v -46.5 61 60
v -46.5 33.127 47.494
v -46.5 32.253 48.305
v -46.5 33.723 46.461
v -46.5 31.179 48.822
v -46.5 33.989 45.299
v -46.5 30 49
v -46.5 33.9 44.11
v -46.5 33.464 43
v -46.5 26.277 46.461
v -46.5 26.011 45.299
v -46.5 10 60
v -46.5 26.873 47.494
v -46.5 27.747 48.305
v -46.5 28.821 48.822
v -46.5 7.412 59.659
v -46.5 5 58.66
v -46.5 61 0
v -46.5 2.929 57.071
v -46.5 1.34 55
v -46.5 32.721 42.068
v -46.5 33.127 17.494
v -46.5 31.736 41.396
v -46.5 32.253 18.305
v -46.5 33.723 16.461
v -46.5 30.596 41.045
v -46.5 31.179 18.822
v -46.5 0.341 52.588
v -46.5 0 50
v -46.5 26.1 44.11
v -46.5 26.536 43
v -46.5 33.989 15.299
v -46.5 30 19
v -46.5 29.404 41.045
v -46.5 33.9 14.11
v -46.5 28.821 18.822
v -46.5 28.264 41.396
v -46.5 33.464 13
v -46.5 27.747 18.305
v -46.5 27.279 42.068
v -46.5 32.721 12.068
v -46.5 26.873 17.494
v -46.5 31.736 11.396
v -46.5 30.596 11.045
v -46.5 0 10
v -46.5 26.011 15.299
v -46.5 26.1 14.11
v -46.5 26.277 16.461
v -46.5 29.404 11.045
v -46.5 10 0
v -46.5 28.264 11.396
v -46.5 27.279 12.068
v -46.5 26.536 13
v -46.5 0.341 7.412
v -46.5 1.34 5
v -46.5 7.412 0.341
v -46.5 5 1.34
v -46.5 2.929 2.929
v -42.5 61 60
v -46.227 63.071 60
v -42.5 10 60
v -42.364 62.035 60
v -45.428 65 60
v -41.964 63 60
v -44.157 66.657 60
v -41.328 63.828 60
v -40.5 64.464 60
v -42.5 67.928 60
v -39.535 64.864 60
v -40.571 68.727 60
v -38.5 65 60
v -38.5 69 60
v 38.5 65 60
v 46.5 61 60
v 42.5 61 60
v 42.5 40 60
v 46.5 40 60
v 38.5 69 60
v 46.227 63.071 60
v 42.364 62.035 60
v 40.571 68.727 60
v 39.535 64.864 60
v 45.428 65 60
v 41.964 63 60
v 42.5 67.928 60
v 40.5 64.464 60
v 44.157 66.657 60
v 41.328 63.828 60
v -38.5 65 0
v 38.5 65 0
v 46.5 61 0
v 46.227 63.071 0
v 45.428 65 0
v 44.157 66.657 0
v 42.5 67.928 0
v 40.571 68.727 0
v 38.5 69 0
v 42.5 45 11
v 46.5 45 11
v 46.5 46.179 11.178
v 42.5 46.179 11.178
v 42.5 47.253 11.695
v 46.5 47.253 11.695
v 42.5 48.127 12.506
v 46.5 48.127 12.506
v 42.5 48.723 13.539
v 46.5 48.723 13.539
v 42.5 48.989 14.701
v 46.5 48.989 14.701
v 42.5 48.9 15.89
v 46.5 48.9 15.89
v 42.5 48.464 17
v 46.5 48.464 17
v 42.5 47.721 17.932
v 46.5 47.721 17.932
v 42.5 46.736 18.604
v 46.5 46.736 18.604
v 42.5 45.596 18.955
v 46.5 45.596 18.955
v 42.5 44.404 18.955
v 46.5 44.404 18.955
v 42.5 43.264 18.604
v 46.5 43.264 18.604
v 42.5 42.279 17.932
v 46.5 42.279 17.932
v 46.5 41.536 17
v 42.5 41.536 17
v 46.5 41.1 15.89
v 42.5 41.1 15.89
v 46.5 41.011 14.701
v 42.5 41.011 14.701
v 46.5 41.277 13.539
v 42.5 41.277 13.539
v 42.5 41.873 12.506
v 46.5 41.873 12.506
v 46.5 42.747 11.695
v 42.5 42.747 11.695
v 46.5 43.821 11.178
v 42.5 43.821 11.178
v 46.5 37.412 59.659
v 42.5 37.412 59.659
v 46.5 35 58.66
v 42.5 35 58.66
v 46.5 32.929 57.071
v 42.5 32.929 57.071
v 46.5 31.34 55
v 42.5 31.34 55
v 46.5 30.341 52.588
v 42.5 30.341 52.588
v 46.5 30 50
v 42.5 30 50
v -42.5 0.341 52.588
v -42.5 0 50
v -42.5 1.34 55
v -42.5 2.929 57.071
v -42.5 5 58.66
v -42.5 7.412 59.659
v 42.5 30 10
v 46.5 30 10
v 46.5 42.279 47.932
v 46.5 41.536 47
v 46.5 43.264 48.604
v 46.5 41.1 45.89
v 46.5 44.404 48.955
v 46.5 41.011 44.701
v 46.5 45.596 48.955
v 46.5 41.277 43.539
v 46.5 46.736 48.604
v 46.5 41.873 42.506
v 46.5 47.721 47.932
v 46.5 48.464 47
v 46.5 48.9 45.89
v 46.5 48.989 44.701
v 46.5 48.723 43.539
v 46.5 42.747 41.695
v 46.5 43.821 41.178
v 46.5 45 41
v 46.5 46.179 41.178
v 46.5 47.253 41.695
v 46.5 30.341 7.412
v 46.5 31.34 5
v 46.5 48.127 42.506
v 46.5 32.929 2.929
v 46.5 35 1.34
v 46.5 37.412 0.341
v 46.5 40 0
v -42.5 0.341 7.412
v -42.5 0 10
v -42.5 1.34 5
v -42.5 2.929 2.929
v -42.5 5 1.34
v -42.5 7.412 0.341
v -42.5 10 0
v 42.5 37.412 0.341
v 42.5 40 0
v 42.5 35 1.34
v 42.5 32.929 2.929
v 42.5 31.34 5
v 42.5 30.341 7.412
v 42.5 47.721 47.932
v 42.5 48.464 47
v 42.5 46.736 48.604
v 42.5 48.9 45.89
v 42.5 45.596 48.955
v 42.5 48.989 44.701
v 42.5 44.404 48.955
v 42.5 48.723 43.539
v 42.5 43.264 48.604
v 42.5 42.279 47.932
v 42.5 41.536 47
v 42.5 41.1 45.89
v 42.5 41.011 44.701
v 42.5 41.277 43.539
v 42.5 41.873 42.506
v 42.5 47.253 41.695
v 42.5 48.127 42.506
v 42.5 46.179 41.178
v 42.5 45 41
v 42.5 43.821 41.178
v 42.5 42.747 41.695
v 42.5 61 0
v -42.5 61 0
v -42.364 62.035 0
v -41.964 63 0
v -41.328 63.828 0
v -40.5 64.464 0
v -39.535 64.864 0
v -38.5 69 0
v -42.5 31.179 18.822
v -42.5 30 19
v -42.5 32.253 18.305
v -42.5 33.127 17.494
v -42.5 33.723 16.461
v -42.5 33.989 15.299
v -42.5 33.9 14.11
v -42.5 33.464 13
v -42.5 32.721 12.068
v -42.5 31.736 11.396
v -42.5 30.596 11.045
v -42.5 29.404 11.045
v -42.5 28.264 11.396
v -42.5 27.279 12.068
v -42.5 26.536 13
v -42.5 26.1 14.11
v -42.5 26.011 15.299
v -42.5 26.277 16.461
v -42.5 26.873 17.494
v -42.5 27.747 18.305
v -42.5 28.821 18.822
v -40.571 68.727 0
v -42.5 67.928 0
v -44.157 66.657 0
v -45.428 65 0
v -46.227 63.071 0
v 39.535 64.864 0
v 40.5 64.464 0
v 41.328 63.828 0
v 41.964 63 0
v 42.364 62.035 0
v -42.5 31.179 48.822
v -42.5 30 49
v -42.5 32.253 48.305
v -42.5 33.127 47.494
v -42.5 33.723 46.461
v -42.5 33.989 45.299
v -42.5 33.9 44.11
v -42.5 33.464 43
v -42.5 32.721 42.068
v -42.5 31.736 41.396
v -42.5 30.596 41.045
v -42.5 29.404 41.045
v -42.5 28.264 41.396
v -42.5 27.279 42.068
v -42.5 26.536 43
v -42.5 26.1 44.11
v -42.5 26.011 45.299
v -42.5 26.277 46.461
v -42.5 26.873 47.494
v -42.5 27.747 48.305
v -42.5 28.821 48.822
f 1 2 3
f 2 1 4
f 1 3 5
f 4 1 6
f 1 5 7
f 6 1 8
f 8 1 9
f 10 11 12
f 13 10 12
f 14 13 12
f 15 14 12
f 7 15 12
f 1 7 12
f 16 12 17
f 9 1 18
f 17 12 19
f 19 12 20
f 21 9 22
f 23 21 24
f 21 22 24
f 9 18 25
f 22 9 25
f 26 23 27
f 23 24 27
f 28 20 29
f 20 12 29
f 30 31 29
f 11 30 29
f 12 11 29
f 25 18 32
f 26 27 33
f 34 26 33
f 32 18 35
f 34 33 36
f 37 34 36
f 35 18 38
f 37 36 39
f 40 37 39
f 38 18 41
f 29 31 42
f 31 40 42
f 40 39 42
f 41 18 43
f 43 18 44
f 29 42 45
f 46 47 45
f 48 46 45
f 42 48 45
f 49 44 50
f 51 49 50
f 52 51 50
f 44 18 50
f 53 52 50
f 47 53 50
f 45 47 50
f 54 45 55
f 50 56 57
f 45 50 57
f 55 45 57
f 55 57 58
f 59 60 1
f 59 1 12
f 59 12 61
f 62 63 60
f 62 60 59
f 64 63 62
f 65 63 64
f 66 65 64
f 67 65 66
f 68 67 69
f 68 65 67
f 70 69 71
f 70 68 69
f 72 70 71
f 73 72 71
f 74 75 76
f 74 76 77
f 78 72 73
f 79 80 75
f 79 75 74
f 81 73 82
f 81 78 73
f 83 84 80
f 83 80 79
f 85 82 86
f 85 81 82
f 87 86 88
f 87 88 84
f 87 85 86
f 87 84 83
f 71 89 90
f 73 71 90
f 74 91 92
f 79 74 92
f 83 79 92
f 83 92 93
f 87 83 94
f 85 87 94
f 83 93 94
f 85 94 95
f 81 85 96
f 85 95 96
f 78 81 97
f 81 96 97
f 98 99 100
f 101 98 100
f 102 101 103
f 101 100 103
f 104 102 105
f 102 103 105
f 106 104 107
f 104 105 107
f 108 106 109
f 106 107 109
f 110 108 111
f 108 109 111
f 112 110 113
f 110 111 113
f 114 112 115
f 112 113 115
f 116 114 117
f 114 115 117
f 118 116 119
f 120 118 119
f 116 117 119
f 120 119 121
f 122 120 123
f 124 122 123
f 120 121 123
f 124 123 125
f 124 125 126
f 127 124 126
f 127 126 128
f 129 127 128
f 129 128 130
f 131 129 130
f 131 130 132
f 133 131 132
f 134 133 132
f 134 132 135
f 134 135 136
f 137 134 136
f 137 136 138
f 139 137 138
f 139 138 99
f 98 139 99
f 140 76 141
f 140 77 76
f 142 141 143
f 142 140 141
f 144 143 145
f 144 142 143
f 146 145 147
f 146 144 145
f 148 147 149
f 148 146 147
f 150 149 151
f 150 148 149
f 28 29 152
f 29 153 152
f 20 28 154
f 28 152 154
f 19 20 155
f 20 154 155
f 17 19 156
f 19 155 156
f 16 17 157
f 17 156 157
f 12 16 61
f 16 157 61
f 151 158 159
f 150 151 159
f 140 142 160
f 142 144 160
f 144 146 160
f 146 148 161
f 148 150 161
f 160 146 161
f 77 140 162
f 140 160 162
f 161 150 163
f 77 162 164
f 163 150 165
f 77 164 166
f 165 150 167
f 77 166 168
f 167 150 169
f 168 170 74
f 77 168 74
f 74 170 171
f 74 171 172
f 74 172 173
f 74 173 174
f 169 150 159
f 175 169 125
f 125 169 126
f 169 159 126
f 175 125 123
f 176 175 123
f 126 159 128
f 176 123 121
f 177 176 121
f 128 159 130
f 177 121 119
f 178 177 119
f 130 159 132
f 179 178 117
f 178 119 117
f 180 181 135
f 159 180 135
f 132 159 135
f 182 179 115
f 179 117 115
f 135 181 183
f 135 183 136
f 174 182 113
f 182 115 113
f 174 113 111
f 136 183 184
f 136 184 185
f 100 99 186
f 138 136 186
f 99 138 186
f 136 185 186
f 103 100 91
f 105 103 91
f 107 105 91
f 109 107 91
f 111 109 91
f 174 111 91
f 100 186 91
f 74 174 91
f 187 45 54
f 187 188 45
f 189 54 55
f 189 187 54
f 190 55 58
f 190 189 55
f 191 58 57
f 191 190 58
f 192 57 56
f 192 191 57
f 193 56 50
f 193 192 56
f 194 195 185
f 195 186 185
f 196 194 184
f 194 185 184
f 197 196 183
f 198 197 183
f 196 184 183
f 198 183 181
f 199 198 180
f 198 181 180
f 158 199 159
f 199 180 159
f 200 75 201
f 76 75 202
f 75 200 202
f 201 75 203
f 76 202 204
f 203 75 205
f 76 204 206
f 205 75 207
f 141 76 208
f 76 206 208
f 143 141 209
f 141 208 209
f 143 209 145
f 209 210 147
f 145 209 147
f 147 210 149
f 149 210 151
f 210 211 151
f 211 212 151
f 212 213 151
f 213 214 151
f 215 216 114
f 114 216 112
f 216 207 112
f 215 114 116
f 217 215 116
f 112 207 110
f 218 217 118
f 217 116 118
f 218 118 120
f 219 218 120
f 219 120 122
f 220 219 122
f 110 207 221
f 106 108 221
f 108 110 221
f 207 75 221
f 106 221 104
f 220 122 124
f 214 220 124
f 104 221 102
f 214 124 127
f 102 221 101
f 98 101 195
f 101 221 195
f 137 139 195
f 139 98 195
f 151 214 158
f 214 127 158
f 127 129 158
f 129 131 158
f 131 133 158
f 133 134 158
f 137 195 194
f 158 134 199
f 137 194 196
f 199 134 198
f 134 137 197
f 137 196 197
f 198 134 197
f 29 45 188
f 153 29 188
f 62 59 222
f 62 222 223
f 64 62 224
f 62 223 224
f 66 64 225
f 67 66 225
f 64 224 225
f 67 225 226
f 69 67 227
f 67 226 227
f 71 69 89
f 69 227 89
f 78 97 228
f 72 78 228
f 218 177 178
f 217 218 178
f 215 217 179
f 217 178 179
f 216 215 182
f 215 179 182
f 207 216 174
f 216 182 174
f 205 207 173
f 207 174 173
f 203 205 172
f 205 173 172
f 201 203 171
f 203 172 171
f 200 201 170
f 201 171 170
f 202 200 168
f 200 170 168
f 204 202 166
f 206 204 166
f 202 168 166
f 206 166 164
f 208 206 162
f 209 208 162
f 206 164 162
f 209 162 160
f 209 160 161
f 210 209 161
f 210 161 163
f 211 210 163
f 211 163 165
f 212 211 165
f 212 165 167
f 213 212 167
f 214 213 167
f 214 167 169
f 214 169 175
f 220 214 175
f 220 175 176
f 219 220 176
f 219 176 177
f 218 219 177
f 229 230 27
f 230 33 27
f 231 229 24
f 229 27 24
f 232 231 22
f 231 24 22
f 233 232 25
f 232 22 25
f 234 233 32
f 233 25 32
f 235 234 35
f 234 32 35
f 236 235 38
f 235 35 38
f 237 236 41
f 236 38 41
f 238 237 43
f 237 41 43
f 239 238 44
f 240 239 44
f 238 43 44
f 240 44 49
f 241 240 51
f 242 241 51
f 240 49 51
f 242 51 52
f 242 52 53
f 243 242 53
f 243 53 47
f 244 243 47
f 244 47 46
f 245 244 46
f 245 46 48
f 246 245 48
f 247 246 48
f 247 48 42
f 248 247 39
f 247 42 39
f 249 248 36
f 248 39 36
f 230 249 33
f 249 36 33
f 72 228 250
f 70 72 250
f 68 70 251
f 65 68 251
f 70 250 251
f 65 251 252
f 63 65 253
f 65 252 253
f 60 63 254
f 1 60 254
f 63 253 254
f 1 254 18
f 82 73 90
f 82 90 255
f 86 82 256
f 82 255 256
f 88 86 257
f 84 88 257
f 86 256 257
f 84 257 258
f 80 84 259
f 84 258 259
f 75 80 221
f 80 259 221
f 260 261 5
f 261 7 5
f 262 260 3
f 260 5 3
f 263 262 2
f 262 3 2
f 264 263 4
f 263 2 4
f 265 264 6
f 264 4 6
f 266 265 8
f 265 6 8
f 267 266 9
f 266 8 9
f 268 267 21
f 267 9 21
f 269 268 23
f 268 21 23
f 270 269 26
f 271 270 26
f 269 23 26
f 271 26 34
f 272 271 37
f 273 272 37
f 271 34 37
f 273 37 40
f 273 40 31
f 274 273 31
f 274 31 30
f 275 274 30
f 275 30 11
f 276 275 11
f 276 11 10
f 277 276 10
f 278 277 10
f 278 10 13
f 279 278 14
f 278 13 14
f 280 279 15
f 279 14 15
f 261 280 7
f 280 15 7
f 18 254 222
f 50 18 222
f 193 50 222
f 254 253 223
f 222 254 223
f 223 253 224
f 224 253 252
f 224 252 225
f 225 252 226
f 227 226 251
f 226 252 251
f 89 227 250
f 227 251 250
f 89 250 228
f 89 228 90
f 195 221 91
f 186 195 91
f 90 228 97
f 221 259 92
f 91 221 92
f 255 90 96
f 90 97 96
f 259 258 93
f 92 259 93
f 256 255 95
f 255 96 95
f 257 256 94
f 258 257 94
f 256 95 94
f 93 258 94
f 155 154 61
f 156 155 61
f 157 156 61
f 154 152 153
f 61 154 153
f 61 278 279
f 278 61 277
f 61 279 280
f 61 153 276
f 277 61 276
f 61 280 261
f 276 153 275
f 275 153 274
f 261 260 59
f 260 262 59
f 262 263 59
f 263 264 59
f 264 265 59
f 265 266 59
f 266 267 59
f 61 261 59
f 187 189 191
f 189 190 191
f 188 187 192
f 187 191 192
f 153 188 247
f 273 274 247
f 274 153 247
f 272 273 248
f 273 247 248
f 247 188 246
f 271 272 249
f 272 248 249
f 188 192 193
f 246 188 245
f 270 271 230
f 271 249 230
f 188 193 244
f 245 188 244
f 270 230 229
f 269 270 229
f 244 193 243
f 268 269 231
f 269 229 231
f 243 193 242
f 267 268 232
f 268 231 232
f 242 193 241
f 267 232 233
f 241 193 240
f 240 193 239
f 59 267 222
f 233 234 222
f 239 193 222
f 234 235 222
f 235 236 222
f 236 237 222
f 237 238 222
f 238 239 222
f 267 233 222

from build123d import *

# Parameters (mm, degrees)
EXTRUDE_1_DEPTH     = 60
CUT_EXTRUDE_1_REACH = 95
SKETCH_2_R          = 4
FILLET_1_R          = 10
CUT_EXTRUDE_2_REACH = 95
SKETCH_3_R          = 4


with BuildPart() as part:
    # 草图1 → 凸台-拉伸1 (new body)
    with BuildSketch(Plane.XY):
        with BuildLine():
            Line((-42.5, 0), (-42.5, 61))
            ThreePointArc((-42.5, 61), (-41.328427125, 63.828427125), (-38.5, 65))
            Line((-38.5, 65), (38.5, 65))
            ThreePointArc((38.5, 65), (41.328427125, 63.828427125), (42.5, 61))
            Line((42.5, 61), (42.5, 30))
            Line((42.5, 30), (46.5, 30))
            Line((46.5, 30), (46.5, 61))
            ThreePointArc((46.5, 61), (44.156854249, 66.656854249), (38.5, 69))
            Line((38.5, 69), (-38.5, 69))
            ThreePointArc((-38.5, 69), (-44.156854249, 66.656854249), (-46.5, 61))
            Line((-46.5, 61), (-46.5, 0))
            Line((-46.5, 0), (-42.5, 0))
        make_face()
    extrude(amount=EXTRUDE_1_DEPTH)

    # 草图2 → 切除-拉伸1 (cut, up to next)
    with BuildSketch(Plane.ZY.offset(46.5), mode=Mode.PRIVATE) as cut_extrude_1_sk1:
        with Locations((15, 30)):
            Circle(SKETCH_2_R)
    cut_extrude_1_tool1 = extrude(cut_extrude_1_sk1.sketch, amount=-CUT_EXTRUDE_1_REACH, mode=Mode.PRIVATE) & part.part
    add(cut_extrude_1_tool1.solids().sort_by_distance((-46.5, 30, 15))[0], mode=Mode.SUBTRACT)
    # 草图2 → 切除-拉伸1 (cut, up to next)
    with BuildSketch(Plane.ZY.offset(46.5), mode=Mode.PRIVATE) as cut_extrude_1_sk2:
        with Locations((45, 30)):
            Circle(SKETCH_2_R)
    cut_extrude_1_tool2 = extrude(cut_extrude_1_sk2.sketch, amount=-CUT_EXTRUDE_1_REACH, mode=Mode.PRIVATE) & part.part
    add(cut_extrude_1_tool2.solids().sort_by_distance((-46.5, 30, 45))[0], mode=Mode.SUBTRACT)

    # 圆角1
    fillet_1_edges = [part.edges().sort_by_distance(p)[0] for p in [
        (44.5, 30, 0),
        (-44.5, 0, 0),
        (44.5, 30, 60),
        (-44.5, 0, 60),
    ]]
    fillet(fillet_1_edges, radius=FILLET_1_R)

    # 草图3 → 切除-拉伸2 (cut, up to next)
    with BuildSketch(Plane(origin=(46.5, 0, 0), x_dir=(0, 0, -1), z_dir=(1, 0, 0)), mode=Mode.PRIVATE) as cut_extrude_2_sk1:
        with Locations((-45, 45)):
            Circle(SKETCH_3_R)
    cut_extrude_2_tool1 = extrude(cut_extrude_2_sk1.sketch, amount=-CUT_EXTRUDE_2_REACH, mode=Mode.PRIVATE) & part.part
    add(cut_extrude_2_tool1.solids().sort_by_distance((46.5, 45, 45))[0], mode=Mode.SUBTRACT)
    # 草图3 → 切除-拉伸2 (cut, up to next)
    with BuildSketch(Plane(origin=(46.5, 0, 0), x_dir=(0, 0, -1), z_dir=(1, 0, 0)), mode=Mode.PRIVATE) as cut_extrude_2_sk2:
        with Locations((-15, 45)):
            Circle(SKETCH_3_R)
    cut_extrude_2_tool2 = extrude(cut_extrude_2_sk2.sketch, amount=-CUT_EXTRUDE_2_REACH, mode=Mode.PRIVATE) & part.part
    add(cut_extrude_2_tool2.solids().sort_by_distance((46.5, 45, 15))[0], mode=Mode.SUBTRACT)


solid = part.part
